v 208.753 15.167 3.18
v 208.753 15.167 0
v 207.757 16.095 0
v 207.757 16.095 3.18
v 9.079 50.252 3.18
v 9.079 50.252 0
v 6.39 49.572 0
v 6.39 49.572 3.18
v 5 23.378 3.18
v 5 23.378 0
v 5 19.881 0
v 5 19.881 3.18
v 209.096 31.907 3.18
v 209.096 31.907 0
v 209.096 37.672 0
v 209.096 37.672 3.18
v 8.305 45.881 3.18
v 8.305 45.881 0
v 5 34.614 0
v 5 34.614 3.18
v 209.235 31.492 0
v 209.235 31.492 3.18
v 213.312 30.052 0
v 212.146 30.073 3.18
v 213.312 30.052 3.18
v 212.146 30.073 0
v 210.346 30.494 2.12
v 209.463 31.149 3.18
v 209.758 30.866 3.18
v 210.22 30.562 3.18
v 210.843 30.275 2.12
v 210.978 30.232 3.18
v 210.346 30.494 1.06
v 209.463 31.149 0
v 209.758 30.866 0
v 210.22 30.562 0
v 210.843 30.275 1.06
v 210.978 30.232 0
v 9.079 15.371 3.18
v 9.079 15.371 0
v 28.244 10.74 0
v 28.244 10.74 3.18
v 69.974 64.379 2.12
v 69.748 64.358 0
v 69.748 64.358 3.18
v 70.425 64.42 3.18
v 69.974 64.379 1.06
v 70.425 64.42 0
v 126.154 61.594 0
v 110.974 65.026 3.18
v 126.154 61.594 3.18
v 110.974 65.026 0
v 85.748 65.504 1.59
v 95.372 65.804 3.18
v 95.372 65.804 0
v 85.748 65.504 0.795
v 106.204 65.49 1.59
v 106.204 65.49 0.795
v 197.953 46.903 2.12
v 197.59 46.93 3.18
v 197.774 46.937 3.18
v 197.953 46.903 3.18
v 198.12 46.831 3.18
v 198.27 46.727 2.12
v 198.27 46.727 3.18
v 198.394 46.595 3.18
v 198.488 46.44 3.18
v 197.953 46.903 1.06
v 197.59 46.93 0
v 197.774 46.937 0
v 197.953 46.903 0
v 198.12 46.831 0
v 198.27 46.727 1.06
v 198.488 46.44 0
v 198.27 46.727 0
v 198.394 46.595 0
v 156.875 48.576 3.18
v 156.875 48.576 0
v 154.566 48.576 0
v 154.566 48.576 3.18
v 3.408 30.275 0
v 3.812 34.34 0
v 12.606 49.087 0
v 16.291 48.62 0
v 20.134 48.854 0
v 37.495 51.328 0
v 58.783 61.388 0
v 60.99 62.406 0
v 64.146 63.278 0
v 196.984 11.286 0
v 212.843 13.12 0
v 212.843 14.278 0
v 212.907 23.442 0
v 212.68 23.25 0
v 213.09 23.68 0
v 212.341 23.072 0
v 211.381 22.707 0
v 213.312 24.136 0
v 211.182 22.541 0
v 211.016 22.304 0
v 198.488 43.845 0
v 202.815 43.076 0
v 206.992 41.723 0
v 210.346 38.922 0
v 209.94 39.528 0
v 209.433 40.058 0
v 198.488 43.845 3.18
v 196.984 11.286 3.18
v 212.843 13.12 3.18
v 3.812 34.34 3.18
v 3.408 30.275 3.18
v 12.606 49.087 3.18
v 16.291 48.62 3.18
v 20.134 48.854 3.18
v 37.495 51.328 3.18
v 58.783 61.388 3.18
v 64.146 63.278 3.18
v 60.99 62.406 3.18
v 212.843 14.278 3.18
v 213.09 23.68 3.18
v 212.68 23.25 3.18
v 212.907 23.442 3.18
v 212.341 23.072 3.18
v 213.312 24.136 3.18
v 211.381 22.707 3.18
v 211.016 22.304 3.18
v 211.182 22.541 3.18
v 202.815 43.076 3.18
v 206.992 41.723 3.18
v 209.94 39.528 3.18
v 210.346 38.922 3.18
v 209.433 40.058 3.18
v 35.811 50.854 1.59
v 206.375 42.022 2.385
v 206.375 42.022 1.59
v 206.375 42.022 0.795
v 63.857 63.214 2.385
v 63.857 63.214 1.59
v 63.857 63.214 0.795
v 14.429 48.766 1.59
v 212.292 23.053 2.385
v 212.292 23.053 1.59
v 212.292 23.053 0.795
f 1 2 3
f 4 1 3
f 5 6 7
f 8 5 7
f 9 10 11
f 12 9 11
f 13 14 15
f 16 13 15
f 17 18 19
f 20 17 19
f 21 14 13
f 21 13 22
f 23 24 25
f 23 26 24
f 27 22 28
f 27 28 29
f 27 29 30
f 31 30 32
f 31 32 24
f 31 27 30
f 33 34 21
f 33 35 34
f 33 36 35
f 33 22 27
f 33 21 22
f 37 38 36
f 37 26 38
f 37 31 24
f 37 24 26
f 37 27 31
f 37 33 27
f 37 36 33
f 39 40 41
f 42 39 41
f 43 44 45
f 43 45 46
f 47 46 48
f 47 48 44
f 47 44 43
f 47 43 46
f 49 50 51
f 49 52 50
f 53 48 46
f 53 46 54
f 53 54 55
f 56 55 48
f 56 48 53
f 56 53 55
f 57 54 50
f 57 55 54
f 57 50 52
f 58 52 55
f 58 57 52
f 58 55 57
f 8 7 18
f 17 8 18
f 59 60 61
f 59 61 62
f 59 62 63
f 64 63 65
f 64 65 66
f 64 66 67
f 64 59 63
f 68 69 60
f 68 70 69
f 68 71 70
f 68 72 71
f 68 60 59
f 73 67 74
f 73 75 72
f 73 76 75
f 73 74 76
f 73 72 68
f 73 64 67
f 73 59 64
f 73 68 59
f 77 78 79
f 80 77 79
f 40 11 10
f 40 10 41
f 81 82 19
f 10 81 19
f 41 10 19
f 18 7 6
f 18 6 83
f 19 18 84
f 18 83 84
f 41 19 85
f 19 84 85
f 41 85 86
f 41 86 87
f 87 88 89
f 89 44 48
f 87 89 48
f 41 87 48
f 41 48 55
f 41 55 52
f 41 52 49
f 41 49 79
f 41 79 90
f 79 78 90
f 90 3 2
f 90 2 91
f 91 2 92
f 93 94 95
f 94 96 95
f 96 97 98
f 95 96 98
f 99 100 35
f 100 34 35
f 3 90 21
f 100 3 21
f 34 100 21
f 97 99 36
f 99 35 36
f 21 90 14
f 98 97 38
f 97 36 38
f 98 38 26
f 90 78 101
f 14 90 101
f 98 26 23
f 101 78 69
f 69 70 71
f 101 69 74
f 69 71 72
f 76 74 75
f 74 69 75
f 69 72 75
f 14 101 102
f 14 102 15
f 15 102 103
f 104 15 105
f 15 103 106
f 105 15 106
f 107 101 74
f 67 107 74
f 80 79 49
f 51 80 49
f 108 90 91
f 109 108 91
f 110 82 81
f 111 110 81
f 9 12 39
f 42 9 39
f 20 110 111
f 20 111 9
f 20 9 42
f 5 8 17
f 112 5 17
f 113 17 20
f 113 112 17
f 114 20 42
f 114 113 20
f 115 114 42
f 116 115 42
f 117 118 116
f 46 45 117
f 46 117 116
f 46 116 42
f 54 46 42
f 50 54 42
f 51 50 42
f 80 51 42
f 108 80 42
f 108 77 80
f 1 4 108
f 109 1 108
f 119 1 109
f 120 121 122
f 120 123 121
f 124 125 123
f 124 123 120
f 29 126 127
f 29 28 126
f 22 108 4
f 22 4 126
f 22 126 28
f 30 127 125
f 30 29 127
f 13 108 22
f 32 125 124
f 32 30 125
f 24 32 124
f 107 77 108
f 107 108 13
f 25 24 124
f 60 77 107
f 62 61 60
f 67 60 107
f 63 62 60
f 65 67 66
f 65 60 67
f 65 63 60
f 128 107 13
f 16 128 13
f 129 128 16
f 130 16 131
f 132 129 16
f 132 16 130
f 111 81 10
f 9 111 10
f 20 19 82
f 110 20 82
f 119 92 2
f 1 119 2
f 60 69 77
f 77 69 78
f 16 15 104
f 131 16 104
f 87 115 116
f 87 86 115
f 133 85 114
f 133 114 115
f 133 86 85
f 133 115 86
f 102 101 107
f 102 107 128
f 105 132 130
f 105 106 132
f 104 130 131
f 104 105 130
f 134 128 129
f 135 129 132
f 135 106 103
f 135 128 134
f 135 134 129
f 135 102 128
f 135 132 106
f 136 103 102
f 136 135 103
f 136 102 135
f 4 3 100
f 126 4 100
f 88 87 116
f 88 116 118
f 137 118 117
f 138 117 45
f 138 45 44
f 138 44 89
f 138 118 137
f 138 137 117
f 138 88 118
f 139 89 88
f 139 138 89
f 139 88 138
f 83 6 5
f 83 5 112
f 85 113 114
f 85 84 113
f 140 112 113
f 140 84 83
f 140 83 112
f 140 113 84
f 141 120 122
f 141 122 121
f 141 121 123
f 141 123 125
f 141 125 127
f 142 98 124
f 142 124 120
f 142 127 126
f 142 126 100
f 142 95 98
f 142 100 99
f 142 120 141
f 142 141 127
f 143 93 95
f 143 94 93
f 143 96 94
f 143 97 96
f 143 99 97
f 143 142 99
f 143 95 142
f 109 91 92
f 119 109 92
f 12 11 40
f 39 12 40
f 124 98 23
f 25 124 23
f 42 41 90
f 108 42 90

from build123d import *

# Parameters (mm, degrees)
BOSS_EXTRUDE2_DEPTH = 3.18


with BuildPart() as part:
    # Sketch3 → Boss-Extrude2 (new body)
    with BuildSketch(Plane.XY):
        with BuildLine():
            Line((154.566276863, 48.576), (126.154248002, 61.593943228))
            add(Edge.make_bspline(
                [(70.42492341, 64.420190492), (71.539940423, 64.519647115), (74.003845296, 64.716372581), (79.10872622, 65.136602193), (96.644785351, 66.182060474), (113.226942999, 66.103763633), (126.154248002, 61.593943228)],
                knots=[0.037653962, 0.037653962, 0.037653962, 0.037653962, 0.095230039, 0.164778525, 0.301013956, 1, 1, 1, 1], degree=3))
            add(Edge.make_bspline(
                [(69.748246193, 64.358453822), (69.973763165, 64.379520838), (70.199324622, 64.400067666), (70.42492341, 64.420190492)],
                knots=[0.026004729, 0.026004729, 0.026004729, 0.026004729, 0.037653962, 0.037653962, 0.037653962, 0.037653962], degree=3))
            add(Edge.make_bspline(
                [(58.782586434, 61.3879207), (59.955341201, 62.098447326), (61.681198084, 62.675723092), (64.027199959, 63.266819743), (66.422854867, 63.735360745), (68.36941666, 64.202932371), (69.748246193, 64.358453822)],
                knots=[0, 0, 0, 0, 0.338683805, 0.447560599, 0.600475936, 0.944024822, 0.944024822, 0.944024822, 0.944024822], degree=3))
            add(Edge.make_bspline(
                [(20.133826985, 48.853685786), (23.946969175, 49.456022002), (28.845183788, 49.969770281), (34.092791307, 50.505206975), (36.003857037, 50.880366768), (39.598247839, 51.906864384), (47.175860034, 55.732014815), (54.085013367, 59.506177314), (58.782586434, 61.3879207)],
                knots=[0, 0, 0, 0, 0.281454695, 0.359726601, 0.384533669, 0.423485214, 0.632085306, 1, 1, 1, 1], degree=3))
            add(Edge.make_bspline(
                [(9.07850141, 50.252079796), (14.251537818, 47.979183465), (20.133826985, 48.853685786)],
                knots=[0, 0, 0, 1, 1, 1], degree=2))
            Line((9.07850141, 50.252079796), (6.389579219, 49.571823086))
            Line((6.389579219, 49.571823086), (8.304869981, 45.881039625))
            Line((8.304869981, 45.881039625), (5.000125196, 34.613874444))
            Line((5.000125196, 34.613874444), (3.811505877, 34.339527184))
            Line((3.811505877, 34.339527184), (3.408141633, 30.275420379))
            Line((3.408141633, 30.275420379), (5.000125196, 23.378094633))
            Line((5.000125196, 23.378094633), (5.000125196, 19.880575438))
            Line((5.000125196, 19.880575438), (9.07850141, 15.370666667))
            Line((9.07850141, 15.370666667), (28.244198642, 10.740288968))
            Line((28.244198642, 10.740288968), (196.984326141, 11.285656733))
            Line((196.984326141, 11.285656733), (212.842666667, 13.119535563))
            Line((212.842666667, 13.119535563), (212.842666667, 14.278444622))
            Line((212.842666667, 14.278444622), (208.753166993, 15.166653328))
            Line((208.753166993, 15.166653328), (207.756612292, 16.09457661))
            Line((207.756612292, 16.09457661), (211.015778832, 22.30376088))
            add(Edge.make_bspline(
                [(213.311956775, 24.136094227), (213.208583455, 23.862222048), (212.957279088, 23.380062736), (212.30833351, 23.029337441), (211.606742708, 22.860432983), (211.183551066, 22.623391283), (211.015778832, 22.30376088)],
                knots=[0, 0, 0, 0, 0.295149858, 0.505508593, 0.707213933, 1, 1, 1, 1], degree=3))
            Line((213.311956775, 24.136094227), (213.311956775, 30.052431591))
            add(Edge.make_bspline(
                [(209.096417688, 31.906934109), (209.232301931, 31.198493688), (209.920582822, 30.680437528), (211.427560224, 29.98694305), (212.520853083, 30.088762434), (213.311956775, 30.052431591)],
                knots=[0, 0, 0, 0, 0.389815246, 0.499049524, 1, 1, 1, 1], degree=3))
            Line((209.096417688, 31.906934109), (209.096417688, 37.672126537))
            Line((209.096417688, 37.672126537), (210.346467514, 38.922176363))
            add(Edge.make_bspline(
                [(198.487796099, 43.845060743), (200.154143731, 43.736954664), (202.765045449, 43.082987453), (206.182994866, 42.256184747), (208.528724374, 40.831088376), (209.910383176, 39.742707025), (210.346467514, 38.922176363)],
                knots=[0, 0, 0, 0, 0.376788936, 0.61445489, 0.789914739, 1, 1, 1, 1], degree=3))
            Line((198.487796099, 43.845060743), (198.487796099, 46.439819769))
            add(Edge.make_bspline(
                [(197.590488958, 46.929659684), (197.958176787, 46.989526936), (198.336218206, 46.769514411), (198.487796099, 46.439819769)],
                knots=[0, 0, 0, 0, 1, 1, 1, 1], degree=3))
            Line((197.590488958, 46.929659684), (156.874666667, 48.576))
            Line((156.874666667, 48.576), (154.566276863, 48.576))
        make_face()
    extrude(amount=BOSS_EXTRUDE2_DEPTH)


solid = part.part
